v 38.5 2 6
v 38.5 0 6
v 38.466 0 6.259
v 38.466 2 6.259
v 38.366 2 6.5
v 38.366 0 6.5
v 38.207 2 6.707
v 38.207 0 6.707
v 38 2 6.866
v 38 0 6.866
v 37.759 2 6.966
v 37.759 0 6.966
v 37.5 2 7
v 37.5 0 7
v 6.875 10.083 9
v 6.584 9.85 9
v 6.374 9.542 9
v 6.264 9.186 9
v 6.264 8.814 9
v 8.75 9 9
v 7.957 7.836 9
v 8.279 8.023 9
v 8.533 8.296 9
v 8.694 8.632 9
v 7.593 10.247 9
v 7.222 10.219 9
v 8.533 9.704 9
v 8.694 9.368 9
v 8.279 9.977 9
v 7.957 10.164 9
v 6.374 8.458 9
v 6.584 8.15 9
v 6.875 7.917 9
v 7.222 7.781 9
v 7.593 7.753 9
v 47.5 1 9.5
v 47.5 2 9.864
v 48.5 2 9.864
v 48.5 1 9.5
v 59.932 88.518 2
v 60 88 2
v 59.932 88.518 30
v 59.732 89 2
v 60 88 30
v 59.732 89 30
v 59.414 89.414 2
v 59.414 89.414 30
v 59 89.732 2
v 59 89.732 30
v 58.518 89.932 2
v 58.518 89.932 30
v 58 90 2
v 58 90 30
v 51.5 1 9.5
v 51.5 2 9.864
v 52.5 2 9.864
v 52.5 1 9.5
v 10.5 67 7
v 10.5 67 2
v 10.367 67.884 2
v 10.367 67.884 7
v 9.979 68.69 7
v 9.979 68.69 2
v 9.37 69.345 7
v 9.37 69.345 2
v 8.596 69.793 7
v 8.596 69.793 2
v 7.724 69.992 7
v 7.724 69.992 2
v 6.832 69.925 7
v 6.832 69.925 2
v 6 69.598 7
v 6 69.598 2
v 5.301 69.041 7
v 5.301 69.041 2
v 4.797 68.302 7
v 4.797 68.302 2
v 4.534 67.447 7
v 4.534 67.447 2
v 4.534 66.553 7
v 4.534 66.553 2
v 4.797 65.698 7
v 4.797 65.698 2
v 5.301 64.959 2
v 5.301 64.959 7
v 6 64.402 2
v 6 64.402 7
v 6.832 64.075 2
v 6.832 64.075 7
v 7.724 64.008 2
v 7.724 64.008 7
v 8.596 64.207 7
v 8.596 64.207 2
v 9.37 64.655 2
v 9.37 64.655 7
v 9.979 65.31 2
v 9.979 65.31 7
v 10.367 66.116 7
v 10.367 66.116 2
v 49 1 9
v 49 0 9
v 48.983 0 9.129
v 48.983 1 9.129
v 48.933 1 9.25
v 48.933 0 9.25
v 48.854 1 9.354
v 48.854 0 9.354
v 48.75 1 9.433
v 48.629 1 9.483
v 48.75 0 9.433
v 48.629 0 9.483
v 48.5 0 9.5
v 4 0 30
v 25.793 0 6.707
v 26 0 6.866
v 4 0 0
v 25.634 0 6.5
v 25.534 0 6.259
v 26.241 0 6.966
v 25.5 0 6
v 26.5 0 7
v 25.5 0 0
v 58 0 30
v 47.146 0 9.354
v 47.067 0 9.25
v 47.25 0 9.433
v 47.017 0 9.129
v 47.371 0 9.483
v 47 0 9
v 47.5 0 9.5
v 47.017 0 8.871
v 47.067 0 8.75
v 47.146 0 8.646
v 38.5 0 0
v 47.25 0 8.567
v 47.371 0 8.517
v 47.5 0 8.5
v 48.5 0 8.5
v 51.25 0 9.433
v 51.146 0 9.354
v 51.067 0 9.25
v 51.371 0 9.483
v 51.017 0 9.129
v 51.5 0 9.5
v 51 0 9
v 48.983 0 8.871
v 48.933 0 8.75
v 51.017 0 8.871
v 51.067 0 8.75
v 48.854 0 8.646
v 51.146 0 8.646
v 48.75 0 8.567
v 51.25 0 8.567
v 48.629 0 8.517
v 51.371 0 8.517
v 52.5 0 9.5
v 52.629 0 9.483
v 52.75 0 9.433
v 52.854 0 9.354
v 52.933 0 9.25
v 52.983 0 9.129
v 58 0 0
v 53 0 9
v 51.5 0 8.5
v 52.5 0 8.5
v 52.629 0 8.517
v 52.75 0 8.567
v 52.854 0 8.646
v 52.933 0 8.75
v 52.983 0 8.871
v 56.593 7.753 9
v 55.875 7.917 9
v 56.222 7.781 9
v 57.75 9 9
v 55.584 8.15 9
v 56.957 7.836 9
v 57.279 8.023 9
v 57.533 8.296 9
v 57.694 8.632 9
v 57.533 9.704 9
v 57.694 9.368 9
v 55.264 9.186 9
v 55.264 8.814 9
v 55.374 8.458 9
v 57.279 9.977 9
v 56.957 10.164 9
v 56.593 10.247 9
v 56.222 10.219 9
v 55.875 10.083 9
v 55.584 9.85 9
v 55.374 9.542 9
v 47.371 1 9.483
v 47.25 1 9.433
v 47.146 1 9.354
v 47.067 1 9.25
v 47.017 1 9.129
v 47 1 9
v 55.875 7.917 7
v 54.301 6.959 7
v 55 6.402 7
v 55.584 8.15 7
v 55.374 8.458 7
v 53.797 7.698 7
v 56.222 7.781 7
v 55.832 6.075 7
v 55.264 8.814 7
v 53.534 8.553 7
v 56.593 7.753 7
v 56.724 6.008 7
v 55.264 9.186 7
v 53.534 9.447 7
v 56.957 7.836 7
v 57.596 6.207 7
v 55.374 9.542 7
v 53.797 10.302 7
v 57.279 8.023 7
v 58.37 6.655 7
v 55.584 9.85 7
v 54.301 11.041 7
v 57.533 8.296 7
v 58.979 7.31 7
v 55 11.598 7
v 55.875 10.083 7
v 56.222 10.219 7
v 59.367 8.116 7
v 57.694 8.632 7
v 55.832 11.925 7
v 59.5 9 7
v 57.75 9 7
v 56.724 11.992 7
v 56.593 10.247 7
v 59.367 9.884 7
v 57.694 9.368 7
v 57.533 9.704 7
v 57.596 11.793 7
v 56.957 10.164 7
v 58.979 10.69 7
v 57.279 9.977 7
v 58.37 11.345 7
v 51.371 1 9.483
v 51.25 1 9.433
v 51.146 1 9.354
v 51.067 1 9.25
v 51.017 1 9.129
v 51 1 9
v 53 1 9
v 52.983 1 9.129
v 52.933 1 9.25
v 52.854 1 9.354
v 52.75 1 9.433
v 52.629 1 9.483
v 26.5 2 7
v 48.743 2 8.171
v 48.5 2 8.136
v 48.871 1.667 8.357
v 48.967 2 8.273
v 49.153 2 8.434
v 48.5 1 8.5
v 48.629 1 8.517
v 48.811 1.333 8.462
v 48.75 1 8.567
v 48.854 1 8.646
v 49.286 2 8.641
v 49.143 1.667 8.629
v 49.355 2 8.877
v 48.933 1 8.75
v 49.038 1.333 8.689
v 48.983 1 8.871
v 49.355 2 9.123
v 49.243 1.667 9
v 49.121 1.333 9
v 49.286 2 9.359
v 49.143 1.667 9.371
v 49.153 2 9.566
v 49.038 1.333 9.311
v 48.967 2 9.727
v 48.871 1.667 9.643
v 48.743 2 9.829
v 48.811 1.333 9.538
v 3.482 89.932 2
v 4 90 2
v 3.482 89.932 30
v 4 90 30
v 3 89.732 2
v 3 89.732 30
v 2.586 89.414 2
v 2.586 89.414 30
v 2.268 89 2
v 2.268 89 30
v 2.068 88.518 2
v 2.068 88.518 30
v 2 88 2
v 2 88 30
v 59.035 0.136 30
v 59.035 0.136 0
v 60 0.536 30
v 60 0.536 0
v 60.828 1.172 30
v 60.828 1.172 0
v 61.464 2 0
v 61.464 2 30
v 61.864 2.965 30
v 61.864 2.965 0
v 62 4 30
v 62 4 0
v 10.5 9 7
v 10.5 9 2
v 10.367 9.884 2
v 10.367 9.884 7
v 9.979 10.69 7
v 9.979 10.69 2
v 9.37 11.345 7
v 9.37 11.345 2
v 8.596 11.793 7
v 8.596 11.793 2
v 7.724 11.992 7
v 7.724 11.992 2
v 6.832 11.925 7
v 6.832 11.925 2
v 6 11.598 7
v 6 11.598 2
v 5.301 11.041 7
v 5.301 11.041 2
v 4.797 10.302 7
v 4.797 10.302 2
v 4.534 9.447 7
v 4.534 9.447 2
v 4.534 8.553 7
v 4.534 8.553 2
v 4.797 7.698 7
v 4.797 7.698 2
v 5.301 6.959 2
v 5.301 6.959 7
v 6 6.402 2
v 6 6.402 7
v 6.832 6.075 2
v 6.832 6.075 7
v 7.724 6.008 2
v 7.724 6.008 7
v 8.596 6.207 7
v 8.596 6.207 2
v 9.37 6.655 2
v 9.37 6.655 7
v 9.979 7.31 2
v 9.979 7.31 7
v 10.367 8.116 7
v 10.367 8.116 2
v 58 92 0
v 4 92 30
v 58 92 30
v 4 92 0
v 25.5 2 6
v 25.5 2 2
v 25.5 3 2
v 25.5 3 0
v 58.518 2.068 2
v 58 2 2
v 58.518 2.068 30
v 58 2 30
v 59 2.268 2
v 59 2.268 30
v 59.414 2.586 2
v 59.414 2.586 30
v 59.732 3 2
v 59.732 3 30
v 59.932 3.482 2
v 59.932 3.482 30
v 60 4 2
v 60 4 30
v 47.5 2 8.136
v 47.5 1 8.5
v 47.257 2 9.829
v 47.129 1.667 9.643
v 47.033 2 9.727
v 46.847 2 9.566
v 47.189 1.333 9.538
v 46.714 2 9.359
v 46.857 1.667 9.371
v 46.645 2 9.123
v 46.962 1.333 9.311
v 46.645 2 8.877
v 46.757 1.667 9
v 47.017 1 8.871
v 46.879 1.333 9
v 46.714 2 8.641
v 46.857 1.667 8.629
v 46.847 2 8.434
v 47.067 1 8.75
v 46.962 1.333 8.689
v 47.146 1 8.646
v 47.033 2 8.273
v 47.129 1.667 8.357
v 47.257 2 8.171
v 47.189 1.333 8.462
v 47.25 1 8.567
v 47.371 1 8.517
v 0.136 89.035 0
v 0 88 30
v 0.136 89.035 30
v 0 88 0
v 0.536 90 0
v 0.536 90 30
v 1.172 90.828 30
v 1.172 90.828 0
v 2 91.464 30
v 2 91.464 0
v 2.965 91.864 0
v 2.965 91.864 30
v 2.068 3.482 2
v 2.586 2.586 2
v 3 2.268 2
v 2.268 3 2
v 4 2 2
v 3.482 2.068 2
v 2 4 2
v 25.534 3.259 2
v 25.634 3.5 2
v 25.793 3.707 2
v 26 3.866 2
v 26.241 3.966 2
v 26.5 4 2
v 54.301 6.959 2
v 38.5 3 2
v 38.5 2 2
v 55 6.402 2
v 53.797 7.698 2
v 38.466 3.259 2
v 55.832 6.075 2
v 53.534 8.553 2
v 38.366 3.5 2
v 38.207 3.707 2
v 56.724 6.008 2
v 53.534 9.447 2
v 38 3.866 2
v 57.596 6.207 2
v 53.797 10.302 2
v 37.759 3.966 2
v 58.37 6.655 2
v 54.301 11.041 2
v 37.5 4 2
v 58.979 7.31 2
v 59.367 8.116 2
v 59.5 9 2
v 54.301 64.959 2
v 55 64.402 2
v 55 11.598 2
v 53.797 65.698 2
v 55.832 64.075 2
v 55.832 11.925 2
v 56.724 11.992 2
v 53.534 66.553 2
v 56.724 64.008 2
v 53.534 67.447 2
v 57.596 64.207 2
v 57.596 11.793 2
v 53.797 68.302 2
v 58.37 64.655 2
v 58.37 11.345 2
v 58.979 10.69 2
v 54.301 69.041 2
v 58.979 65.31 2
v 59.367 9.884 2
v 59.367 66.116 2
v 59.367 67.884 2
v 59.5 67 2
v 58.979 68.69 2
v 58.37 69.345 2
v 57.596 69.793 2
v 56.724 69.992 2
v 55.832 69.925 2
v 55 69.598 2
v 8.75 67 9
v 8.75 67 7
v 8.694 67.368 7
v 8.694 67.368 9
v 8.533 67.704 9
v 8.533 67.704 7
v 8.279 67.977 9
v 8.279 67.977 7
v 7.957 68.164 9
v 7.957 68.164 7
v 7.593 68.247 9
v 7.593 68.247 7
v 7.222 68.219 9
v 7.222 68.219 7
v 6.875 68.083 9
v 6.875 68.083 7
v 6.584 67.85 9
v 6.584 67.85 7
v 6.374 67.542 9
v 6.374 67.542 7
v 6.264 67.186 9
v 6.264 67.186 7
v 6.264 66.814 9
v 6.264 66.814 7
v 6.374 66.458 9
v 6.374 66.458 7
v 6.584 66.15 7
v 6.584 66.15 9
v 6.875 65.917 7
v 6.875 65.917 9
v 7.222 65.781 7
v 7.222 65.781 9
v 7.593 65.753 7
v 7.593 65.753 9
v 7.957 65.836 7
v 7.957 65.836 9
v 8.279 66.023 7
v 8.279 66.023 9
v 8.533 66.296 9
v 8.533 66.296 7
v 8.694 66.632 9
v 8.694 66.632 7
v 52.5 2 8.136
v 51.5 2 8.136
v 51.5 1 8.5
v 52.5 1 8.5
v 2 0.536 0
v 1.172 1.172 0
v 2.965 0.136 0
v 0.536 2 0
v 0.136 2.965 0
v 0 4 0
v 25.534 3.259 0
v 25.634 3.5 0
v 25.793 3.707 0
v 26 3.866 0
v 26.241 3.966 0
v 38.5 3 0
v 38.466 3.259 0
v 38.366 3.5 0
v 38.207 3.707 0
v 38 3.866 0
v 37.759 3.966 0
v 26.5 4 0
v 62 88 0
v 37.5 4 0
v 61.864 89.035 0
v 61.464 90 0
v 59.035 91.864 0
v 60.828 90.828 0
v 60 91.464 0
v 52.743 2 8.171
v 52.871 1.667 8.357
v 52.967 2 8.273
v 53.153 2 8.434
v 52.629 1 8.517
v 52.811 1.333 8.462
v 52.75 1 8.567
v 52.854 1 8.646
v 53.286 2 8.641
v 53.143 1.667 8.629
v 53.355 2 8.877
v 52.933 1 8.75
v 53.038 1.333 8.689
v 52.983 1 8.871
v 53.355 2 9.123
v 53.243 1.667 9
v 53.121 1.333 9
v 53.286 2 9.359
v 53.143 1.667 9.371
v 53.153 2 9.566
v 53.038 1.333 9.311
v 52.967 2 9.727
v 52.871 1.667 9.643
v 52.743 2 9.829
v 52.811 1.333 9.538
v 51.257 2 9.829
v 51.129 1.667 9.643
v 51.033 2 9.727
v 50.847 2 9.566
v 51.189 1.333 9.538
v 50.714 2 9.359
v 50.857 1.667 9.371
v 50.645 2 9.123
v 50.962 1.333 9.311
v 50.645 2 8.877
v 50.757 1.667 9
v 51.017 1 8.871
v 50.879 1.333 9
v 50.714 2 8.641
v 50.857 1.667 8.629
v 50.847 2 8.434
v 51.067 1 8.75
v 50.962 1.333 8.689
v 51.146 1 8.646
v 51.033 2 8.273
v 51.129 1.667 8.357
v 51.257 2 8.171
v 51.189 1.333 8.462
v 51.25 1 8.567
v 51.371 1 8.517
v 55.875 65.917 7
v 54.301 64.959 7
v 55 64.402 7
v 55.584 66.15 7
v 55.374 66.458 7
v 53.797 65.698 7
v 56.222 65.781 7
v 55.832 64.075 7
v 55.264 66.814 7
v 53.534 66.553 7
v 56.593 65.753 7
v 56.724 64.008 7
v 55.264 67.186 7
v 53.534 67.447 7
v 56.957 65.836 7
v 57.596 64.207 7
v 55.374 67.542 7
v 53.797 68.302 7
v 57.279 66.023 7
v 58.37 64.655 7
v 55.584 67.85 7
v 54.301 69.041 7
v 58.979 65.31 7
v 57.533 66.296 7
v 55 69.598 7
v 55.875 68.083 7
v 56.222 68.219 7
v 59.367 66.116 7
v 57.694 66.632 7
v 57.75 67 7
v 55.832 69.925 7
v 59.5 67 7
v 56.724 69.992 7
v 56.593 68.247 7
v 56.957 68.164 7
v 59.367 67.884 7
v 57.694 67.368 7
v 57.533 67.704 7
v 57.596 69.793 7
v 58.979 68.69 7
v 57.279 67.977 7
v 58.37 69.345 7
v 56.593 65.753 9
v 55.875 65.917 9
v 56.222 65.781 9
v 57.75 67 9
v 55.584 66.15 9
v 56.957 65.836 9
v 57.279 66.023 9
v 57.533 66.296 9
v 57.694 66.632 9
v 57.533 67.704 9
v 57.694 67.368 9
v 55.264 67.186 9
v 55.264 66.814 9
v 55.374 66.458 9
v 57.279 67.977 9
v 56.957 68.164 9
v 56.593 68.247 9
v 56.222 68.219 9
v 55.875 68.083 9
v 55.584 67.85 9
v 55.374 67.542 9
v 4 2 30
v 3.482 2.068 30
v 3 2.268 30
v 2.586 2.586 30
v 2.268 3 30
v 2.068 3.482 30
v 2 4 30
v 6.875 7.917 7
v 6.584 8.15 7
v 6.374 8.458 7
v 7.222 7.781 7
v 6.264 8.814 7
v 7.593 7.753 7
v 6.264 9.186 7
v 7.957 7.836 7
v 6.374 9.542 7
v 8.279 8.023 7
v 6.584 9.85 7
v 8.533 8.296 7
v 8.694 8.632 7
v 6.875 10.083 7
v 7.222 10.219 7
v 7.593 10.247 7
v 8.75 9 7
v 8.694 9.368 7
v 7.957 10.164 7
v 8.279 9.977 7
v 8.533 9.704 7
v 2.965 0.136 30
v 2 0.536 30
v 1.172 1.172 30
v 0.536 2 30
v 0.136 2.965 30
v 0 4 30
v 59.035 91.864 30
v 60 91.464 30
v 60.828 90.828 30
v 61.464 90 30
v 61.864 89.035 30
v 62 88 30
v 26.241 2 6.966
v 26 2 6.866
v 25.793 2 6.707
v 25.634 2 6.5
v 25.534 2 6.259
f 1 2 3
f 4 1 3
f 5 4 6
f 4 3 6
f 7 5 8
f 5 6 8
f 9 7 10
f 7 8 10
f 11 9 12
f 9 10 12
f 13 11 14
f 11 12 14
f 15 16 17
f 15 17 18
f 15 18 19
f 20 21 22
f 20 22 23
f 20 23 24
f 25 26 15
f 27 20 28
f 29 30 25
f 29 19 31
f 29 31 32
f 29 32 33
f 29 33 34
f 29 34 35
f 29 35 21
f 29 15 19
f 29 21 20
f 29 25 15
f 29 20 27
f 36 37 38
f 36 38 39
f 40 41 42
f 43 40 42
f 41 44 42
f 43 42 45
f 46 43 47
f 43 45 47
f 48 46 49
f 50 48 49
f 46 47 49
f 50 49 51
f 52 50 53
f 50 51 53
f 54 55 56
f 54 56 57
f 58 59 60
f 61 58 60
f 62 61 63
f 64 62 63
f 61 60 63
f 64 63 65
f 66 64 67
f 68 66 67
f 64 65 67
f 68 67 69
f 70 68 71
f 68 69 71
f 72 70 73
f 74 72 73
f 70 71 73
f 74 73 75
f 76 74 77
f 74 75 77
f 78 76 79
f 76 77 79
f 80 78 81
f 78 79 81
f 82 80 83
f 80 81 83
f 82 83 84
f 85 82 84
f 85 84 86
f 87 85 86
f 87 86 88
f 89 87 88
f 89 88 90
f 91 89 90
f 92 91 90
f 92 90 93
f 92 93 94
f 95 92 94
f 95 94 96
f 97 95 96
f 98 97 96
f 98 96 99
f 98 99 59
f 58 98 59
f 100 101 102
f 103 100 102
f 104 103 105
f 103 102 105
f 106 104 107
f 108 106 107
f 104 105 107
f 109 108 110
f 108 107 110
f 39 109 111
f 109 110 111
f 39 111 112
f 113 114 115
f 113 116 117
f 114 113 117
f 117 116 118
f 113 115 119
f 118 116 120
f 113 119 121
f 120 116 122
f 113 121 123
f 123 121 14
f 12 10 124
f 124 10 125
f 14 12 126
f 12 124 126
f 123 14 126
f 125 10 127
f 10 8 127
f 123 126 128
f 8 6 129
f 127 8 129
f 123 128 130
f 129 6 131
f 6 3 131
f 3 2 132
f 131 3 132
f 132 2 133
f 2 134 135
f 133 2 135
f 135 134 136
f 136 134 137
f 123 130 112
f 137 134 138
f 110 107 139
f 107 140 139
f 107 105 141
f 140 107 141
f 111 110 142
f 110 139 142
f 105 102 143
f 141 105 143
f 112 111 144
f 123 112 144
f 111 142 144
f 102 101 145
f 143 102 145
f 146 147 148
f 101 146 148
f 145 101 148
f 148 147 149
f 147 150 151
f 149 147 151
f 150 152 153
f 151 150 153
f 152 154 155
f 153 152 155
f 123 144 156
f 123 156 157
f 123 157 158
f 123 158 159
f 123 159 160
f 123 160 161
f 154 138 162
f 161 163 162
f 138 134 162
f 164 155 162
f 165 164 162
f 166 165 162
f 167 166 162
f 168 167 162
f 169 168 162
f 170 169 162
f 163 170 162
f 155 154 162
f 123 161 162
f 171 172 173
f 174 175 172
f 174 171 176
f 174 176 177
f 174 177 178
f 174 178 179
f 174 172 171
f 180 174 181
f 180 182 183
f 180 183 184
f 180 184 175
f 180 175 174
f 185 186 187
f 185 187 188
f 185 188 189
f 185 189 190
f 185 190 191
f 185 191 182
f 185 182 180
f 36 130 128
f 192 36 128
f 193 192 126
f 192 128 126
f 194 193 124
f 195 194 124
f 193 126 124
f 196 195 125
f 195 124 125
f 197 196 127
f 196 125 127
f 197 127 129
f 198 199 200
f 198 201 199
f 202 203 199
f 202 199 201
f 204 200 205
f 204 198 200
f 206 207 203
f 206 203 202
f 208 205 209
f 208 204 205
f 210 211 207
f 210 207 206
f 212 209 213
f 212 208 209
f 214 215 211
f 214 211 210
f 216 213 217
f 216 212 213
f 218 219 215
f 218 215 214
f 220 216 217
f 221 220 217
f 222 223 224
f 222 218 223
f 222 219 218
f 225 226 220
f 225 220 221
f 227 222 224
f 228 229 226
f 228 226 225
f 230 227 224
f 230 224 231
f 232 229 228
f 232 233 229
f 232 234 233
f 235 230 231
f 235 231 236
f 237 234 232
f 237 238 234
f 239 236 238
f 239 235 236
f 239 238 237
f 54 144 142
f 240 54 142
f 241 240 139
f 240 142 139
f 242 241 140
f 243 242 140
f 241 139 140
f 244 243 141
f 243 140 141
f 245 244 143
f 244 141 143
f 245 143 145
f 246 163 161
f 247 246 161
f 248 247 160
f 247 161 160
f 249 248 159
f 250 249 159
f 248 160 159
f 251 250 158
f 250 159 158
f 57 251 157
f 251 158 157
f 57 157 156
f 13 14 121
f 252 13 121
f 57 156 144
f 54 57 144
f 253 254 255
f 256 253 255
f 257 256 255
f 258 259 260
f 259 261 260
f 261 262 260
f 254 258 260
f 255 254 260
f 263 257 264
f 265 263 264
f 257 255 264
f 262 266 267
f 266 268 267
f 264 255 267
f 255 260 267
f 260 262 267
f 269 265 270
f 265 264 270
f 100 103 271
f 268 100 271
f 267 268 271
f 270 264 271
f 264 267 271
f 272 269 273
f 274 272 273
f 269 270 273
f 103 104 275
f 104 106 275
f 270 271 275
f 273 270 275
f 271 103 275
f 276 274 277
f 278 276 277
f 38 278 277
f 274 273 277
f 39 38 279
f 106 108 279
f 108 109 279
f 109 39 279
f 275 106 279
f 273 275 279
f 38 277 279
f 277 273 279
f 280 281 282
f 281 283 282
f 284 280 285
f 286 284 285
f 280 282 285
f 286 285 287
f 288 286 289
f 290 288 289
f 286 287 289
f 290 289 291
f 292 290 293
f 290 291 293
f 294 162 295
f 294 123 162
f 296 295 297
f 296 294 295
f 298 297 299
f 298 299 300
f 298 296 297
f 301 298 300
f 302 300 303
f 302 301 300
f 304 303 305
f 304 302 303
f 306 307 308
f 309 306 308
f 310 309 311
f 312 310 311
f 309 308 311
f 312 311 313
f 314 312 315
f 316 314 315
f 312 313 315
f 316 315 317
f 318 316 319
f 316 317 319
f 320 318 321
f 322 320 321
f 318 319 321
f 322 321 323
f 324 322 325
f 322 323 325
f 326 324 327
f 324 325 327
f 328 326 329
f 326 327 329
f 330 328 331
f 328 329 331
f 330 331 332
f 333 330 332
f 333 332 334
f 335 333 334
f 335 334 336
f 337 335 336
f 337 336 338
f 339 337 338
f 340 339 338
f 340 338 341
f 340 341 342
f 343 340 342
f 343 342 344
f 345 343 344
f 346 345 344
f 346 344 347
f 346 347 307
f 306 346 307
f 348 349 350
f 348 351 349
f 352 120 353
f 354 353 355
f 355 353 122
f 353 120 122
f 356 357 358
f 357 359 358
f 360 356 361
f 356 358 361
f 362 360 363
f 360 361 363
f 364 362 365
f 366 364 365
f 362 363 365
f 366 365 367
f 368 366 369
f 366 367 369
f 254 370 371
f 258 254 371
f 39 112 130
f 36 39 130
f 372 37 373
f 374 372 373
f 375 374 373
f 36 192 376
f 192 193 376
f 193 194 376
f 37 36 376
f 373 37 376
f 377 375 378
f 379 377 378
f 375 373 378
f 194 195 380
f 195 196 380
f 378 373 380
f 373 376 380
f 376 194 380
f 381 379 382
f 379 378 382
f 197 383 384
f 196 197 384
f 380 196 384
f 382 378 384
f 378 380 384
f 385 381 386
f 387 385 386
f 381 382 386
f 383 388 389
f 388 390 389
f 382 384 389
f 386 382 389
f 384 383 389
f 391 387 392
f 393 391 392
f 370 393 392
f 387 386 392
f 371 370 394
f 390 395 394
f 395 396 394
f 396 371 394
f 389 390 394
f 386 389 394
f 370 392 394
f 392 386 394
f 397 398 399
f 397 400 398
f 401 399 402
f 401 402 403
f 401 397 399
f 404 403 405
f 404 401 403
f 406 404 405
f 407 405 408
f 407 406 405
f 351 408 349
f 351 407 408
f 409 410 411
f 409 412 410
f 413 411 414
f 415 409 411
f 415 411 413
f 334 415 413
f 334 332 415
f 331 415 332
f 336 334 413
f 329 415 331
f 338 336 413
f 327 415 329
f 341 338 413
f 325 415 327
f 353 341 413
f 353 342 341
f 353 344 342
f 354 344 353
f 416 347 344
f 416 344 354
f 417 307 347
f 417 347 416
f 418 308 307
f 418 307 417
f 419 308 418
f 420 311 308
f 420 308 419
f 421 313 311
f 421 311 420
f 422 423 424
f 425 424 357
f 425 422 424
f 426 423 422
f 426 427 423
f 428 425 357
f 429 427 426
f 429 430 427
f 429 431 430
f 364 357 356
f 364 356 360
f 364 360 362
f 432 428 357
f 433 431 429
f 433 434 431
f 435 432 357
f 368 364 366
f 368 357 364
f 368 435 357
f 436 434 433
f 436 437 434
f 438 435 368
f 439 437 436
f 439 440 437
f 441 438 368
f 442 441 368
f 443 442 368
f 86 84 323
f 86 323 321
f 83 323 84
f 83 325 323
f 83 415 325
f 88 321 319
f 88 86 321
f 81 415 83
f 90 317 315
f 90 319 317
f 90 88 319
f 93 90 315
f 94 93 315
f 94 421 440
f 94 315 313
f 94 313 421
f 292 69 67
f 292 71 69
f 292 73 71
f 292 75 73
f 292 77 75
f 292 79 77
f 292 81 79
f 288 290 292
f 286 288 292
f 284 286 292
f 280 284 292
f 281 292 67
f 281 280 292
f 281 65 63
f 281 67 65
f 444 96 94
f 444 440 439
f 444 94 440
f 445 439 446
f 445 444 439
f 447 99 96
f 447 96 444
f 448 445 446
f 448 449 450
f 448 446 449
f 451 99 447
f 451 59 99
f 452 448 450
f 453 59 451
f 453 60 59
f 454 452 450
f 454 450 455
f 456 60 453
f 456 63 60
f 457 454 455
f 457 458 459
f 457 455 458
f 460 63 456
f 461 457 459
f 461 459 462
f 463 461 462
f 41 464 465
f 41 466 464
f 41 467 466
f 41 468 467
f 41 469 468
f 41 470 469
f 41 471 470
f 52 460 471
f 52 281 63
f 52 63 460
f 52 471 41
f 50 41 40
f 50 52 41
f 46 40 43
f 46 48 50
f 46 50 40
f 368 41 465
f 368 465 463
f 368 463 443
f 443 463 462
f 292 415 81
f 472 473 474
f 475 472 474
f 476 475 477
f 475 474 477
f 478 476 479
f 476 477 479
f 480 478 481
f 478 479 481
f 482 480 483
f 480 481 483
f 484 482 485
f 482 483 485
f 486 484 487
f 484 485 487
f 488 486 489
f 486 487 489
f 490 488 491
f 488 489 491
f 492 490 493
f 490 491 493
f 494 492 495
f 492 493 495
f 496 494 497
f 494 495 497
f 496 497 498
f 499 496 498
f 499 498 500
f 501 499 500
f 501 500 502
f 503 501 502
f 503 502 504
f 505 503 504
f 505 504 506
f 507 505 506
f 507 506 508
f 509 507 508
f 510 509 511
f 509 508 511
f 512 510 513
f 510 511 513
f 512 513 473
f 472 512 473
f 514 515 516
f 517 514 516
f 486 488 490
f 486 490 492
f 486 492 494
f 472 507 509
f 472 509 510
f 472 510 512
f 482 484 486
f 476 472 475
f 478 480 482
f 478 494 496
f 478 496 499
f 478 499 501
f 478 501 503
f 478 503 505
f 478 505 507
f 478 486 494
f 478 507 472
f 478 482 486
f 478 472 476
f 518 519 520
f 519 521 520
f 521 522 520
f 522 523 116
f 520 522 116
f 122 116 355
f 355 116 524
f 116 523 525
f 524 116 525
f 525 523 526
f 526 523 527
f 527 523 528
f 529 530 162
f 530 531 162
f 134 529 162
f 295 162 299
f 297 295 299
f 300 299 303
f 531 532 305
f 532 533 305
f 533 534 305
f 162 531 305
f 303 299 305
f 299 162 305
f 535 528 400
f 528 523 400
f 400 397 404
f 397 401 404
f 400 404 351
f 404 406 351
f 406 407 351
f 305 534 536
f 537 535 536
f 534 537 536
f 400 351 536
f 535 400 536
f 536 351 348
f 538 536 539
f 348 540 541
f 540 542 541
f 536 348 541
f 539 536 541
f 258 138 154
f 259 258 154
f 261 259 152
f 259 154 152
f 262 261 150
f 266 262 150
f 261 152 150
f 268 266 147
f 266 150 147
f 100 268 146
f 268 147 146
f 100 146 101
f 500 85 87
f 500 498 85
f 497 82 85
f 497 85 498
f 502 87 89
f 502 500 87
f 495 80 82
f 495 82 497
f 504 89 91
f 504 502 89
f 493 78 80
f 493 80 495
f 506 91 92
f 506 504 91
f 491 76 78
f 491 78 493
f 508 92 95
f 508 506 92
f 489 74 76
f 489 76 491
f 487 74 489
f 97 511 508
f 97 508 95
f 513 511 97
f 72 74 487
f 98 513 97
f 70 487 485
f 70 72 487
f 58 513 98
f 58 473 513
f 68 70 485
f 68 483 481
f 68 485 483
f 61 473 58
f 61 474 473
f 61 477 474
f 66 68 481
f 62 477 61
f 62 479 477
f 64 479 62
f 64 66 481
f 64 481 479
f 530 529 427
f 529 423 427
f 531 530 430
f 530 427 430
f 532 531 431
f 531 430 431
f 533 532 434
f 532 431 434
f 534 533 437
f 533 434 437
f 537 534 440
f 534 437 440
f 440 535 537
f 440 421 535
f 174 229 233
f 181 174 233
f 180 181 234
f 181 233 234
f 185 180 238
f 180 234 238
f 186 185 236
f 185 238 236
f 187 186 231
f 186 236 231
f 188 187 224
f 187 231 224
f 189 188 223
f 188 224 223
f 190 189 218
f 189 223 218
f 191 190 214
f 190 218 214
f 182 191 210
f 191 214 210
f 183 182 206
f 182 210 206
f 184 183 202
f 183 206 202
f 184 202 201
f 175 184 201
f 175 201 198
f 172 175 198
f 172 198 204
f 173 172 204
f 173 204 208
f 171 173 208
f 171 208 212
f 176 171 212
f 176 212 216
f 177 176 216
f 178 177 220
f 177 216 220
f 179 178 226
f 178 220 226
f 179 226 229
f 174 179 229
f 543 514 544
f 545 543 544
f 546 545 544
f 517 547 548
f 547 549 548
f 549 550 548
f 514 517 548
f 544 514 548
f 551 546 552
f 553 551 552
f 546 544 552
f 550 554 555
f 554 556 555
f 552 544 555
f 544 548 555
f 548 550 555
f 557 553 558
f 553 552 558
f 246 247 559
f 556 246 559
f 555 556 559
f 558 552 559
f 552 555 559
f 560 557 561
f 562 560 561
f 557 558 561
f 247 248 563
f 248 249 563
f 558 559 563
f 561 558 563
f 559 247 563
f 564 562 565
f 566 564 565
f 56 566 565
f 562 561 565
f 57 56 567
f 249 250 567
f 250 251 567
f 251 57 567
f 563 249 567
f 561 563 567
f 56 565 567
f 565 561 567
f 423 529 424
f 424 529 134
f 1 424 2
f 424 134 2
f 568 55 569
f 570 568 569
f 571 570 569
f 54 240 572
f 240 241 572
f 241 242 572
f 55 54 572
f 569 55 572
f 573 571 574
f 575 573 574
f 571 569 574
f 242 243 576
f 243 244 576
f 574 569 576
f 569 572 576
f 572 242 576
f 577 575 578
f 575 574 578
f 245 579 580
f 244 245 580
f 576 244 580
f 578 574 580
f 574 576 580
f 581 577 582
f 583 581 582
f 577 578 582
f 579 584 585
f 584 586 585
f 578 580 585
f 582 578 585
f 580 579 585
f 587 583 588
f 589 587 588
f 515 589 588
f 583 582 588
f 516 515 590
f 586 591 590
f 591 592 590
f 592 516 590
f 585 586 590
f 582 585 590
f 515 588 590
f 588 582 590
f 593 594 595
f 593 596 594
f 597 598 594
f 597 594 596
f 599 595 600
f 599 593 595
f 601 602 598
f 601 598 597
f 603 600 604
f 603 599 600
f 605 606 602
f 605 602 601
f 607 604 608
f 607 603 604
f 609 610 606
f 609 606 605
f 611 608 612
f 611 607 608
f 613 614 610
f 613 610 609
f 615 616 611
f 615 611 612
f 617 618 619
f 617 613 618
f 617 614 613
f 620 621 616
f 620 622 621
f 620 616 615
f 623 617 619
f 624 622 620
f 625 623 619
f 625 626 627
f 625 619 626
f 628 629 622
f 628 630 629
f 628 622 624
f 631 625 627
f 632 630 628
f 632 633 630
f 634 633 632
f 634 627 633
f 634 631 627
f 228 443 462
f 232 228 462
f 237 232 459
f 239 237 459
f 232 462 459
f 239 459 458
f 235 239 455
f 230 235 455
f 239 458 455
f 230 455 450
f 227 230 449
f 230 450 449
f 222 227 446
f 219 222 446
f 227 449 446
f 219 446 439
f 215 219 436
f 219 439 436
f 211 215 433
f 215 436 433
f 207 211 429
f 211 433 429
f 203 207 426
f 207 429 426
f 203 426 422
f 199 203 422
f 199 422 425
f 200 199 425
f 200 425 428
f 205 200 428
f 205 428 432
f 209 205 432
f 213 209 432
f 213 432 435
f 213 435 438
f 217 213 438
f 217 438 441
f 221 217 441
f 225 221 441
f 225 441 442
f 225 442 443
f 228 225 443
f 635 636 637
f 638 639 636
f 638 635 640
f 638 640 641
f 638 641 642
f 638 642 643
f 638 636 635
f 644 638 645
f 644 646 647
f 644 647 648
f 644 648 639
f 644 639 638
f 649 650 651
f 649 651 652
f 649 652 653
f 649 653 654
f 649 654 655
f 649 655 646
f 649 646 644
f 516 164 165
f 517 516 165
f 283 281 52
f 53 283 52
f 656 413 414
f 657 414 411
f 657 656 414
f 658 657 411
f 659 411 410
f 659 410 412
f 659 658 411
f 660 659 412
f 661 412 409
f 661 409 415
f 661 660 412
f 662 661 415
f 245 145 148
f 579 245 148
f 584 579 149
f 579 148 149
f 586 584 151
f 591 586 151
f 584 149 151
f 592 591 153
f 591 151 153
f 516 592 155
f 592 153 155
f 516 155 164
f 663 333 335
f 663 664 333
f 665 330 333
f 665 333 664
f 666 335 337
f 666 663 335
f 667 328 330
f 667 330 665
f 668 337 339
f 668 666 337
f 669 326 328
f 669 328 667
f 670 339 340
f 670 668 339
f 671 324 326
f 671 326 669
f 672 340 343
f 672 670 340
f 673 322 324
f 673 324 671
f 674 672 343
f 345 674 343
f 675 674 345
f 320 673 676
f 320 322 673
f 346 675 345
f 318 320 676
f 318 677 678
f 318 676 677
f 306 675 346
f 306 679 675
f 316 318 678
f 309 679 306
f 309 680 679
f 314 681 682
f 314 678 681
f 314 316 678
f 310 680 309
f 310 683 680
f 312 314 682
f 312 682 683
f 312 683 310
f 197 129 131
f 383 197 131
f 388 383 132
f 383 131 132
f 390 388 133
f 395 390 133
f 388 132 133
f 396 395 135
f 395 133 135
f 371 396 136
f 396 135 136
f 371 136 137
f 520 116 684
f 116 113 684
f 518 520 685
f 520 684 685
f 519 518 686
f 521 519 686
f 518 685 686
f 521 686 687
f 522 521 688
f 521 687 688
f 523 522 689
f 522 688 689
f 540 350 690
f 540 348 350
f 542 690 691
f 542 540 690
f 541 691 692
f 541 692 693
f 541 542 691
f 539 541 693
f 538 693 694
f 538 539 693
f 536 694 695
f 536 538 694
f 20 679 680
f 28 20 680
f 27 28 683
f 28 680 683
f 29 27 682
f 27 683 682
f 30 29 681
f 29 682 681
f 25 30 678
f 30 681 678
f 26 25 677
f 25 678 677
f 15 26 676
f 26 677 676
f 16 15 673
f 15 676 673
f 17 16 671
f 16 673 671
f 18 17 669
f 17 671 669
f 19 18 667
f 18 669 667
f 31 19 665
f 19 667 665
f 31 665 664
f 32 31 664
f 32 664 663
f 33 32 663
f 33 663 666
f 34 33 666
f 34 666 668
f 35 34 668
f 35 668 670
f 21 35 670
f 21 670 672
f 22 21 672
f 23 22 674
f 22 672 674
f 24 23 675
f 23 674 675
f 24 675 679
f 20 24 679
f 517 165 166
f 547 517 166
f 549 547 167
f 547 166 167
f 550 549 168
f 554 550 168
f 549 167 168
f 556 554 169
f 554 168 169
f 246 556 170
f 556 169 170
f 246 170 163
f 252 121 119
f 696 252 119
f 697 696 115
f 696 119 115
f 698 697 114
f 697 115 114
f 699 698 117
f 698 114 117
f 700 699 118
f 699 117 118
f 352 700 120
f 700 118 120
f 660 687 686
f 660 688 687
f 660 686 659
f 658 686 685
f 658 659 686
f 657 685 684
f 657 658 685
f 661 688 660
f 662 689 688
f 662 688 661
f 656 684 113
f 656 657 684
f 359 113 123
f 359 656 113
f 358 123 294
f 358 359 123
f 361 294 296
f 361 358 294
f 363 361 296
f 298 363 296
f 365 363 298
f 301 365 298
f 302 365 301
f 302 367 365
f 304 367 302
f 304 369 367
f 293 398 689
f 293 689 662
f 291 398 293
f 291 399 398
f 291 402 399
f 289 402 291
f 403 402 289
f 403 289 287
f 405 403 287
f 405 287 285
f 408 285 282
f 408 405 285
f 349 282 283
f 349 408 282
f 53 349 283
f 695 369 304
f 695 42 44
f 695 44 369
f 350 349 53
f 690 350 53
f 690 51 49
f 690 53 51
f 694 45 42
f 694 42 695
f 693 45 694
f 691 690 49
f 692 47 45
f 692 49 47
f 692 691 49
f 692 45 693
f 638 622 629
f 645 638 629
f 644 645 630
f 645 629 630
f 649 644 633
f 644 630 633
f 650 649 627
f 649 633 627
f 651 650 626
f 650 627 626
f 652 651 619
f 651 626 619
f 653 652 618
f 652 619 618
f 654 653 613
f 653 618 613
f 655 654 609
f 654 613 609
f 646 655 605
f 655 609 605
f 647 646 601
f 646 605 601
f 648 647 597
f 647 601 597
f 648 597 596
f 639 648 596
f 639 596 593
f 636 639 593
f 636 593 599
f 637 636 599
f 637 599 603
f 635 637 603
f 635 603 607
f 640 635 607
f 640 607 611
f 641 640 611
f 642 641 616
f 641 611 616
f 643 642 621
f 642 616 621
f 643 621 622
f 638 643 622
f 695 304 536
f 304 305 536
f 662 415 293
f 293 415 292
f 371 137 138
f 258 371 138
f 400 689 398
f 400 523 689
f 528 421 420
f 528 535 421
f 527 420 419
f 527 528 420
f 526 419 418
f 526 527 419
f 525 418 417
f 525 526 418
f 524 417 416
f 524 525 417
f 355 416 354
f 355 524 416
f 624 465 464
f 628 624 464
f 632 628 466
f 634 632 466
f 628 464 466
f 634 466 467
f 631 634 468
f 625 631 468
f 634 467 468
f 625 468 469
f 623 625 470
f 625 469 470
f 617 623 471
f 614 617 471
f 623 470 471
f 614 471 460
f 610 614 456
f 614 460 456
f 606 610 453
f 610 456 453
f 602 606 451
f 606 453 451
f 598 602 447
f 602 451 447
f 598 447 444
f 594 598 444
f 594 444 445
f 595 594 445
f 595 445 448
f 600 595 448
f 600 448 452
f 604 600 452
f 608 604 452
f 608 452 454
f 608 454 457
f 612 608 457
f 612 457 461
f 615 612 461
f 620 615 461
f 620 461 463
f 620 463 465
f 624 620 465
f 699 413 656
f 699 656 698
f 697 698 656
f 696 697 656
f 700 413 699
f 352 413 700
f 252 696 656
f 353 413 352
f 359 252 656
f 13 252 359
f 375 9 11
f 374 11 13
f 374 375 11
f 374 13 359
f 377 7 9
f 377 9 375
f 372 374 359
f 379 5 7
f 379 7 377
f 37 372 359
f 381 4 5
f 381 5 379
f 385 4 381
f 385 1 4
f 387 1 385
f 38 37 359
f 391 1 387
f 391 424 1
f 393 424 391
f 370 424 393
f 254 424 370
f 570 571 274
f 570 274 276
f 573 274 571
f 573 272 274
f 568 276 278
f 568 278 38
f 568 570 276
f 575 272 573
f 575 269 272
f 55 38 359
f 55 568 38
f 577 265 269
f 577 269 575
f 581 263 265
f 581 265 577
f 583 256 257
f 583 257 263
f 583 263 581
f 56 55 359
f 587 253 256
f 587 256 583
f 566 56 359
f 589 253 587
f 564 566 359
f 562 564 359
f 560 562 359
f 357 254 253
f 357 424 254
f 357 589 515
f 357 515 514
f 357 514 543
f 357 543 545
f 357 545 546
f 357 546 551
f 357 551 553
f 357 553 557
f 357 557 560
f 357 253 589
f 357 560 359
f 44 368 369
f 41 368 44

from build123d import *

# Parameters (mm, degrees)
F0_W          = 62
F0_H          = 92
F1_DEPTH      = 2
F2_W          = 62
F2_H          = 92
F2_W_2        = 58
F2_H_2        = 88
F2_R          = 3
F3_DEPTH      = 28
F4_DEPTH      = 23
F5_R          = 1.25
F6_DEPTH      = 2
F7_R          = 1.25
F8_DEPTH      = 2
F9_R          = 1.25
F10_DEPTH     = 2
F11_R         = 1.25
F12_DEPTH     = 2
F14_DEPTH     = 4
F15_R         = 1
F16_R         = 2
F17_R         = 4
F18_T1_DEPTH  = 1
F18_T3_DEPTH  = 1
F18_T6_ANGLE  = 180
F18_T8_ANGLE  = 180
F18_T10_ANGLE = 180
F18_T12_ANGLE = 180


# Not quite as in the source:
# - a fillet or chamfer that OpenCascade refuses, or shapes differently, is made with other operations: its cross-section is extruded or revolved along the edge and cut away or added


with BuildPart() as f1:
    # F0 (on Top) → F1 (new body)
    with BuildSketch(Plane.XY):
        with Locations((31, 46)):
            Rectangle(F0_W, F0_H)
    extrude(amount=F1_DEPTH)

    # F2 (on face) → F3 (join)
    with BuildSketch(Plane.XY.offset(2)):
        with Locations((31, 46)):
            Rectangle(F2_W, F2_H)
        with Locations((31, 46)):
            Rectangle(F2_W_2, F2_H_2, mode=Mode.SUBTRACT)
        with Locations((7.5, 67)):
            Circle(F2_R)
        with Locations((56.5, 67)):
            Circle(F2_R)
        with Locations((7.5, 9)):
            Circle(F2_R)
        with Locations((56.5, 9)):
            Circle(F2_R)
    extrude(amount=F3_DEPTH)

    # F4 (cut): faces of the model
    f4_faces = [f1.faces().sort_by_distance(p)[0] for p in [
        (7.5, 67, 30),
        (56.5, 67, 30),
        (56.5, 9, 30),
        (7.5, 9, 30),
    ]]
    extrude(f4_faces, amount=-F4_DEPTH, mode=Mode.SUBTRACT)

    # F5 (on face) → F6 (join)
    with BuildSketch(Plane.XY.offset(7)):
        with Locations((7.5, 9)):
            Circle(F5_R)
    extrude(amount=F6_DEPTH)

    # F7 (on face) → F8 (join)
    with BuildSketch(Plane.XY.offset(7)):
        with Locations((56.5, 9)):
            Circle(F7_R)
    extrude(amount=F8_DEPTH)

    # F9 (on face) → F10 (join)
    with BuildSketch(Plane.XY.offset(7)):
        with Locations((56.5, 67)):
            Circle(F9_R)
    extrude(amount=F10_DEPTH)

    # F11 (on face) → F12 (join)
    with BuildSketch(Plane.XY.offset(7)):
        with Locations((7.5, 67)):
            Circle(F11_R)
    extrude(amount=F12_DEPTH)

    # F13 (on face) → F14 (cut)
    with BuildSketch(Plane.XZ):
        with BuildLine():
            ThreePointArc((38.5, 6), (38.2071067812, 6.7071067812), (37.5, 7))
            Line((37.5, 7), (26.5, 7))
            ThreePointArc((26.5, 7), (25.7928932188, 6.7071067812), (25.5, 6))
            Line((25.5, 6), (25.5, 0))
            Line((25.5, 0), (38.5, 0))
            Line((38.5, 0), (38.5, 6))
        make_face()
        with BuildLine():
            Line((48.5, 9.5), (47.5, 9.5))
            ThreePointArc((47.5, 9.5), (47.1464466094, 9.3535533906), (47, 9))
            ThreePointArc((47, 9), (47.1464466094, 8.6464466094), (47.5, 8.5))
            Line((47.5, 8.5), (48.5, 8.5))
            ThreePointArc((48.5, 8.5), (48.8535533906, 8.6464466094), (49, 9))
            ThreePointArc((49, 9), (48.8535533906, 9.3535533906), (48.5, 9.5))
        make_face()
        with BuildLine():
            Line((52.5, 9.5), (51.5, 9.5))
            ThreePointArc((51.5, 9.5), (51.1464466094, 9.3535533906), (51, 9))
            ThreePointArc((51, 9), (51.1464466094, 8.6464466094), (51.5, 8.5))
            Line((51.5, 8.5), (52.5, 8.5))
            ThreePointArc((52.5, 8.5), (52.8535533906, 8.6464466094), (53, 9))
            ThreePointArc((53, 9), (52.8535533906, 9.3535533906), (52.5, 9.5))
        make_face()
    extrude(amount=-F14_DEPTH, mode=Mode.SUBTRACT)

    # F15
    f15_edges = [f1.edges().sort_by_distance(p)[0] for p in [
        (25.5, 4, 1),
        (38.5, 4, 1),
    ]]
    fillet(f15_edges, radius=F15_R)

    # F16
    f16_edges = [f1.edges().sort_by_distance(p)[0] for p in [
        (2, 90, 16),
        (60, 90, 16),
        (60, 2, 16),
        (2, 2, 16),
    ]]
    fillet(f16_edges, radius=F16_R)

    # F17
    f17_edges = [f1.edges().sort_by_distance(p)[0] for p in [
        (0, 92, 15),
        (62, 92, 15),
        (62, 0, 15),
        (0, 0, 15),
    ]]
    fillet(f17_edges, radius=F17_R)

    # F18: chamfer of 1 x 0.3639702343 on 8 edges, made by hand

    # F18_s2 → F18_t1 (cut)
    with BuildSketch(Plane.YZ.offset(51.5)):
        Polygon((2, 9.8639702343), (1, 9.5), (2, 9.5), align=None)
        Polygon((2, 8.1360297657), (1, 8.5), (2, 8.5), align=None)
    extrude(amount=F18_T1_DEPTH, mode=Mode.SUBTRACT)

    # F18_s4 → F18_t3 (cut)
    with BuildSketch(Plane.YZ.offset(47.5)):
        Polygon((2, 9.8639702343), (1, 9.5), (2, 9.5), align=None)
        Polygon((2, 8.1360297657), (1, 8.5), (2, 8.5), align=None)
    extrude(amount=F18_T3_DEPTH, mode=Mode.SUBTRACT)

    # F18_s5 → F18_t6 (revolve, cut)
    with BuildSketch(Plane.YZ.offset(51.5)):
        Polygon((2, 9.8639702343), (1, 9.5), (2, 9.5), align=None)
    revolve(axis=Axis((51.5, 2, 9), (0, -1, 0)), revolution_arc=F18_T6_ANGLE, mode=Mode.SUBTRACT)

    # F18_s7 → F18_t8 (revolve, cut)
    with BuildSketch(Plane.YZ.offset(47.5)):
        Polygon((2, 9.8639702343), (1, 9.5), (2, 9.5), align=None)
    revolve(axis=Axis((47.5, 2, 9), (0, -1, 0)), revolution_arc=F18_T8_ANGLE, mode=Mode.SUBTRACT)

    # F18_s9 → F18_t10 (revolve, cut)
    with BuildSketch(Plane.YZ.offset(52.5)):
        Polygon((2, 8.1360297657), (1, 8.5), (2, 8.5), align=None)
    revolve(axis=Axis((52.5, 2, 9), (0, -1, 0)), revolution_arc=F18_T10_ANGLE, mode=Mode.SUBTRACT)

    # F18_s11 → F18_t12 (revolve, cut)
    with BuildSketch(Plane.YZ.offset(48.5)):
        Polygon((2, 8.1360297657), (1, 8.5), (2, 8.5), align=None)
    revolve(axis=Axis((48.5, 2, 9), (0, -1, 0)), revolution_arc=F18_T12_ANGLE, mode=Mode.SUBTRACT)


solid = f1.part
